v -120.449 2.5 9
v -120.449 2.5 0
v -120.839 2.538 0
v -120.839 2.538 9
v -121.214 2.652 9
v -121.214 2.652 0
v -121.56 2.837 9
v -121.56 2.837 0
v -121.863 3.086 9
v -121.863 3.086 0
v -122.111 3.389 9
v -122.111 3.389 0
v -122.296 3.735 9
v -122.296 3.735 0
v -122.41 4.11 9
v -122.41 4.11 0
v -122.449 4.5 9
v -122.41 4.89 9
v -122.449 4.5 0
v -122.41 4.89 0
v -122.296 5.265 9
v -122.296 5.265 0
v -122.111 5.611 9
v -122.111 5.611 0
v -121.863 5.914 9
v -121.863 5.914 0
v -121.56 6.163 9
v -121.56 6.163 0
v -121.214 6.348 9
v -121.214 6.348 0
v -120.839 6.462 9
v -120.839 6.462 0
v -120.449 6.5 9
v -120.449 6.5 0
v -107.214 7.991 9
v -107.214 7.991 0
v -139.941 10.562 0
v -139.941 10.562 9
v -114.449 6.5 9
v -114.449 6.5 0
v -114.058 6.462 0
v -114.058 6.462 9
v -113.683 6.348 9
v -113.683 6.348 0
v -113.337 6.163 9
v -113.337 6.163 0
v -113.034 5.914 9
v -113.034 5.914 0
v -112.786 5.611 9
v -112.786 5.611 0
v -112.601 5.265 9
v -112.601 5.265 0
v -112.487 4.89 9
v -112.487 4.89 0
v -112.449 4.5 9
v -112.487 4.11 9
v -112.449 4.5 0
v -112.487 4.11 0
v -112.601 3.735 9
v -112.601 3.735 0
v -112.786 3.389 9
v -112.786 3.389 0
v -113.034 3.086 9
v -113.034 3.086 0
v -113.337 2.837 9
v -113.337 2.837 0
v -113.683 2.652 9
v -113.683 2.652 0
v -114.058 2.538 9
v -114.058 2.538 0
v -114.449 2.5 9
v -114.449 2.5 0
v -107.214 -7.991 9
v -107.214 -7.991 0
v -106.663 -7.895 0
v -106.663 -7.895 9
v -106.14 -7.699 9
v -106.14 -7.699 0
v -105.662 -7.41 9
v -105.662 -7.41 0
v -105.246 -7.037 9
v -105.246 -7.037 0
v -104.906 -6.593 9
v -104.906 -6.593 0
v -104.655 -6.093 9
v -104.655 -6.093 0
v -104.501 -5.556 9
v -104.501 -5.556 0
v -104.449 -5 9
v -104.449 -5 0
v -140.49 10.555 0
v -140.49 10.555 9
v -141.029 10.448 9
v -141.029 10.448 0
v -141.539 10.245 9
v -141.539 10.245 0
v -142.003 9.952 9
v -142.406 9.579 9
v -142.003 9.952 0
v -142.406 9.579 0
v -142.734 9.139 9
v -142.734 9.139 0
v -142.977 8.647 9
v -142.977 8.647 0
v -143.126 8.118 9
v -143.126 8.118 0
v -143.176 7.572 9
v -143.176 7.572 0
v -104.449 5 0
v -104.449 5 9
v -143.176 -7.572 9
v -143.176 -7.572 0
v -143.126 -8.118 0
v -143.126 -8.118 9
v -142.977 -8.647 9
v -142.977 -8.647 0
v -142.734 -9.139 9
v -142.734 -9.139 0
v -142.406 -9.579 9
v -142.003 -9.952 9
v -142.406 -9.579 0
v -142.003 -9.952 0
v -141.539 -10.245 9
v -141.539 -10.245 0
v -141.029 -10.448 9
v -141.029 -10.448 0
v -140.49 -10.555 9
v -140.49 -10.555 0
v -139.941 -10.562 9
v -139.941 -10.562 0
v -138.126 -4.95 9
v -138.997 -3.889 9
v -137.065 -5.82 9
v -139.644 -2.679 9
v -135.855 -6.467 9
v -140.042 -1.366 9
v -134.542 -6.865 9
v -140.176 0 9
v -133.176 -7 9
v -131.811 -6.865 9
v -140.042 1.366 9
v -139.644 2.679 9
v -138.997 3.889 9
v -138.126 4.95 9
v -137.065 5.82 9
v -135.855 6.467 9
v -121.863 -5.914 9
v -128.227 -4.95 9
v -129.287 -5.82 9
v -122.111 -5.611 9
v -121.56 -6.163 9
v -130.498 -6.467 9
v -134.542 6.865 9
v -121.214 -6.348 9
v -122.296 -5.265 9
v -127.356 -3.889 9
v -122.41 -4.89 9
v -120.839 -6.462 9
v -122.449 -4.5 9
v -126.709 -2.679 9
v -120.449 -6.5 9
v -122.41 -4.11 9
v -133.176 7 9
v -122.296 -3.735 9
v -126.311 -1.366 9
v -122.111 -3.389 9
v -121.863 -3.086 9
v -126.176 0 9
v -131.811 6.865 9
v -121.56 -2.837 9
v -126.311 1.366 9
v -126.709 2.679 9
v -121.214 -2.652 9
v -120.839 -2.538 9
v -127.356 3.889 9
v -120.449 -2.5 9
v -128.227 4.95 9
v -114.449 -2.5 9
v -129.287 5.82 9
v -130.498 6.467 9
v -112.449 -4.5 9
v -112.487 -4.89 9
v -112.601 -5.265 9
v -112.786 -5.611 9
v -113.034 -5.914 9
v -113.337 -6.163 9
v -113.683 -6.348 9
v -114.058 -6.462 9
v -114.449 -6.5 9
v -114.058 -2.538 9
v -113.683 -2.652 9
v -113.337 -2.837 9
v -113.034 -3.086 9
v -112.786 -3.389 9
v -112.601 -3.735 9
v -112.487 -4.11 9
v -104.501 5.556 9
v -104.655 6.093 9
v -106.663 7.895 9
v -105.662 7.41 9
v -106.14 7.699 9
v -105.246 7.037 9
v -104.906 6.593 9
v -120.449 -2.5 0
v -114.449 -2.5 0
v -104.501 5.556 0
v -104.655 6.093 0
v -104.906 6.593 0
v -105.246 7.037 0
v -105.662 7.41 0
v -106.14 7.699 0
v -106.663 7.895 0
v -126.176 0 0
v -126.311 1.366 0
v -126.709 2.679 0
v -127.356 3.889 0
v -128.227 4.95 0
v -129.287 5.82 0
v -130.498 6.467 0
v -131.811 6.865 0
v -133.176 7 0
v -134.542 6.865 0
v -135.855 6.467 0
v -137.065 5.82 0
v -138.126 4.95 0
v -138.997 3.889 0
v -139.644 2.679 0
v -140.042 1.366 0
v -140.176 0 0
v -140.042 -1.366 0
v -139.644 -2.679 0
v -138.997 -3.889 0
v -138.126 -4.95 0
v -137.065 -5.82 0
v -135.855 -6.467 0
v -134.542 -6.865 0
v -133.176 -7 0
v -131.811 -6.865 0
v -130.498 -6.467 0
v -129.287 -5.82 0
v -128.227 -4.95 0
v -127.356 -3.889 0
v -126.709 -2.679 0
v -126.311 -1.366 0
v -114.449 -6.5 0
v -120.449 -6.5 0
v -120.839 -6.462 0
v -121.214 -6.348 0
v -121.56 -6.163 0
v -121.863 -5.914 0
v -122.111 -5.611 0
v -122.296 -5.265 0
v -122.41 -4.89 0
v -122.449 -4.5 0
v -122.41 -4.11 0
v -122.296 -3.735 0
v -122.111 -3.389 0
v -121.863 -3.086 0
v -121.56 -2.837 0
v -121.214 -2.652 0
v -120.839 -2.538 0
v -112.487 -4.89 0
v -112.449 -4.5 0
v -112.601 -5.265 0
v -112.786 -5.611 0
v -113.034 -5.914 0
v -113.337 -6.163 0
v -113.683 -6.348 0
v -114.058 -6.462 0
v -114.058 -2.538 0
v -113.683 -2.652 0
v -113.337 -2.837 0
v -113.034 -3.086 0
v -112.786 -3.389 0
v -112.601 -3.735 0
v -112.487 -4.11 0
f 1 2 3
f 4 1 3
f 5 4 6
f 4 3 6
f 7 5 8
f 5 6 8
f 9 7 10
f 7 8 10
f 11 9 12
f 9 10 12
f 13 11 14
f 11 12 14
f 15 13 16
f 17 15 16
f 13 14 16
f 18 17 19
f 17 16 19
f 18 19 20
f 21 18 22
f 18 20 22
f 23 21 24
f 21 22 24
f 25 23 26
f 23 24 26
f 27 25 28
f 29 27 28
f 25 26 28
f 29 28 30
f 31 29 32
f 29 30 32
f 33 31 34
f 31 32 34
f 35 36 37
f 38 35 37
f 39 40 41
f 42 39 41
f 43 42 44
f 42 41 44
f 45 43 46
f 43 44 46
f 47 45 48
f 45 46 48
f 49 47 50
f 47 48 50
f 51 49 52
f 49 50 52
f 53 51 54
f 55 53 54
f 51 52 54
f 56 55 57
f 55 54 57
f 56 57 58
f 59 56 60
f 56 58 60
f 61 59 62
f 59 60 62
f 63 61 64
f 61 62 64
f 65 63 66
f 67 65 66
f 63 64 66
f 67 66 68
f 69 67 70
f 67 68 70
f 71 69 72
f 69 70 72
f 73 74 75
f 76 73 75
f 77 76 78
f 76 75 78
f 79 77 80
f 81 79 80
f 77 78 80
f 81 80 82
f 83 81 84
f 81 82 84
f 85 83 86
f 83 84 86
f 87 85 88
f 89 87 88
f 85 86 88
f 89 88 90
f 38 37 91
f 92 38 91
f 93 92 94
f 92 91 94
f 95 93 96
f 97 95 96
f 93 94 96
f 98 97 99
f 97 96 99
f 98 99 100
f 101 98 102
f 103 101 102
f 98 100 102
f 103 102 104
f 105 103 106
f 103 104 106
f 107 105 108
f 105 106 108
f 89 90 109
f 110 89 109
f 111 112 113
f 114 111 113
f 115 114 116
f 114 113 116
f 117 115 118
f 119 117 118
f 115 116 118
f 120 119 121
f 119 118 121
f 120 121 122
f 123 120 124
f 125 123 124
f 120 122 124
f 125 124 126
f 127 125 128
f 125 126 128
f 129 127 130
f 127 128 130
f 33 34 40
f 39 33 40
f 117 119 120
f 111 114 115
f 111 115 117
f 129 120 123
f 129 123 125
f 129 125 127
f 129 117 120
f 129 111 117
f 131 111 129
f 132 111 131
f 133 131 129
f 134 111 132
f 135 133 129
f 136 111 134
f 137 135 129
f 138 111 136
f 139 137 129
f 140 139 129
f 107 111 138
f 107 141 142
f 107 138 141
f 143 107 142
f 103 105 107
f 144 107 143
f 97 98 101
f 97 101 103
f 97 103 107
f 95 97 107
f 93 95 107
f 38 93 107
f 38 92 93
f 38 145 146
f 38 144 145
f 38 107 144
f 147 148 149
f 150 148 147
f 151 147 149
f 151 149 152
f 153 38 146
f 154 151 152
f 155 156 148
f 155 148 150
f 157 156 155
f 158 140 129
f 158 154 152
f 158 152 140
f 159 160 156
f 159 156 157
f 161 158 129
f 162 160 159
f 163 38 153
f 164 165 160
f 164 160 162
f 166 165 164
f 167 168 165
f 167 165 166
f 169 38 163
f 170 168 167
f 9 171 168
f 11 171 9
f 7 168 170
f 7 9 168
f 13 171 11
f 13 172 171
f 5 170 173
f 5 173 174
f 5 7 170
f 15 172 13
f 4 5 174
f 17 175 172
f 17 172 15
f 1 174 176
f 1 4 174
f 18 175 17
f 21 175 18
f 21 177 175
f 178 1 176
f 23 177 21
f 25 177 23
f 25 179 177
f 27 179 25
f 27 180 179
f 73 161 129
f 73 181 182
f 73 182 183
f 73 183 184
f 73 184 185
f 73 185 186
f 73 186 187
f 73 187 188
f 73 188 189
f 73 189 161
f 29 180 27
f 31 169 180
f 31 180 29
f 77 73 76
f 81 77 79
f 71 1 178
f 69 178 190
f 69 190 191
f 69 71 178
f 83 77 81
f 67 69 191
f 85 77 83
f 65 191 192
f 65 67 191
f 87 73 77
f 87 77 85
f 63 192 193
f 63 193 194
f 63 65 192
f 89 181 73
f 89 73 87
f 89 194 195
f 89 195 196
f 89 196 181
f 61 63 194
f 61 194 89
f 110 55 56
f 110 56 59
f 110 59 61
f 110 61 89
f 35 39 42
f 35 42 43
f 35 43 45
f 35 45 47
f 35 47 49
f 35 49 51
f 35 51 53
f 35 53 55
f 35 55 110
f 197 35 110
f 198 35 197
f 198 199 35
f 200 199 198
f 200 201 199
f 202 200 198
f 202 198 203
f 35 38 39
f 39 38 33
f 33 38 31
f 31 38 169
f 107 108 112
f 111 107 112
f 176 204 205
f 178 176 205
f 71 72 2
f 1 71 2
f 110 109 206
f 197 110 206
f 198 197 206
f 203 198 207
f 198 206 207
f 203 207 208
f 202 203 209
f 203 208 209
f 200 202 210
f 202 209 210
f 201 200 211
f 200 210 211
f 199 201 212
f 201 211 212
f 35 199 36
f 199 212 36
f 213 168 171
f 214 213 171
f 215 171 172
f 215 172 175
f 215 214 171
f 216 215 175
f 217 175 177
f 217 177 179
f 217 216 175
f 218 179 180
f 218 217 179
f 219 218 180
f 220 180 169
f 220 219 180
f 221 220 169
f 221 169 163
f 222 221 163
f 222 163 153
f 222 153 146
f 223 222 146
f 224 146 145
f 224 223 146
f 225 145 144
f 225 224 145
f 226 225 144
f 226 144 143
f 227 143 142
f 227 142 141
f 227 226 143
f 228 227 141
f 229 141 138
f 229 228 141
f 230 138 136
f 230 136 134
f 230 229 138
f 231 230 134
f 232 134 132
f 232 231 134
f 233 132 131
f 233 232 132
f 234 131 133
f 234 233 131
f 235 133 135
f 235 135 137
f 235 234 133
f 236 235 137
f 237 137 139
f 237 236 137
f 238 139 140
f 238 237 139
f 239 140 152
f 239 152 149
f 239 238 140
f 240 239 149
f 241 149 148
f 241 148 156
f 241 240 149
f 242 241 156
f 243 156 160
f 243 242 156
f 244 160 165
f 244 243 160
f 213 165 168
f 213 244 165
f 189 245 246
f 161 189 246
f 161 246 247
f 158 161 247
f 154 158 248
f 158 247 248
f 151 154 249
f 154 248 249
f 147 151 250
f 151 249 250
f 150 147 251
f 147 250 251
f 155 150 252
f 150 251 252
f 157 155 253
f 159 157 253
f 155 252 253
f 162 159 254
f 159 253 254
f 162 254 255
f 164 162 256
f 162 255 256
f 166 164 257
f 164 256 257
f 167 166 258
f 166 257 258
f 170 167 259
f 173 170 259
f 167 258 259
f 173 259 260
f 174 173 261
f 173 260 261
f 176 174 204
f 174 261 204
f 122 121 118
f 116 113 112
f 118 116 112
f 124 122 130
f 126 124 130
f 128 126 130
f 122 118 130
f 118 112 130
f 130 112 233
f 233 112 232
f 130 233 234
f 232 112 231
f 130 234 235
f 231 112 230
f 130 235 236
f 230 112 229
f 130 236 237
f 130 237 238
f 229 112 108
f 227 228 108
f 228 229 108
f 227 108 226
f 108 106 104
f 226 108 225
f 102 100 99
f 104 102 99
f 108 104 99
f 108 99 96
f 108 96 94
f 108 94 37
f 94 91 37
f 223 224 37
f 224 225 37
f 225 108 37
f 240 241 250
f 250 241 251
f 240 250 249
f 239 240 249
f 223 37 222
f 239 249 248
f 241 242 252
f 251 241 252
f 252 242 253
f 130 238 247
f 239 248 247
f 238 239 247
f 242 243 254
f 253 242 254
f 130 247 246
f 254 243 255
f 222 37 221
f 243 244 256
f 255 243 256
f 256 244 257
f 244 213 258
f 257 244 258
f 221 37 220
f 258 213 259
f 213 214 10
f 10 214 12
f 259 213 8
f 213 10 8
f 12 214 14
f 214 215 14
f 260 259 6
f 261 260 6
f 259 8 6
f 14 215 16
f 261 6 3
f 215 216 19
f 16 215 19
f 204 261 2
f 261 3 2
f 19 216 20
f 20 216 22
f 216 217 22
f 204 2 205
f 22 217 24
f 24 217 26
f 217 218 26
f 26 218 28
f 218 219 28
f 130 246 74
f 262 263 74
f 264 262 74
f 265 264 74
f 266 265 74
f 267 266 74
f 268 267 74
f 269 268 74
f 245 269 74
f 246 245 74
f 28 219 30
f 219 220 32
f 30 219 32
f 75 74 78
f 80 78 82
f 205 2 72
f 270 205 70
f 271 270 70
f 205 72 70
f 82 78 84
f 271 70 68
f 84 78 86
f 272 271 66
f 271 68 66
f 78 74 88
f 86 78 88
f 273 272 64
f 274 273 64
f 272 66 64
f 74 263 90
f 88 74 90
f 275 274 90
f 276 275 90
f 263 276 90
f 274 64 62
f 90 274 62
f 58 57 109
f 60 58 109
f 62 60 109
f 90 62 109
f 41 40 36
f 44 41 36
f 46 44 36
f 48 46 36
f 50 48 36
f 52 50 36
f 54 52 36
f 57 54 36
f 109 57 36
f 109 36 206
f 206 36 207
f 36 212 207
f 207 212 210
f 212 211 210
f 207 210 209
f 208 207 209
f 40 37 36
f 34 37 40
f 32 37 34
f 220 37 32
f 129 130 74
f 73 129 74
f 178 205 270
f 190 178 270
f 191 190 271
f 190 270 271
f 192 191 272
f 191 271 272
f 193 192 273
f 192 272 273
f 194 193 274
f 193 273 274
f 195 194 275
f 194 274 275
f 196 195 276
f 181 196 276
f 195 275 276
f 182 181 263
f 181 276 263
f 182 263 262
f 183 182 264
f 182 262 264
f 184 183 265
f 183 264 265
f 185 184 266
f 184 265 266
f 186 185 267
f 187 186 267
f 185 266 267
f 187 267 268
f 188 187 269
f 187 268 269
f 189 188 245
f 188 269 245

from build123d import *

# Parameters (mm, degrees)
SKETCH1_R           = 7
BOSS_EXTRUDE1_DEPTH = 9


with BuildPart() as part:
    # Sketch1 → Boss-Extrude1 (new body)
    with BuildSketch(Plane.XY):
        with BuildLine():
            Line((-139.941431307, -10.562383746), (-107.213509245, -7.990781577))
            ThreePointArc((-107.213509245, -7.990781577), (-105.245670948, -7.03654075), (-104.448510428, -5))
            Line((-104.448510428, -5), (-104.448510428, 5))
            ThreePointArc((-104.448510428, 5), (-105.245670948, 7.03654075), (-107.213509245, 7.990781577))
            Line((-107.213509245, 7.990781577), (-139.941431307, 10.562383746))
            ThreePointArc((-139.941431307, 10.562383746), (-142.212973239, 9.774441649), (-143.176432489, 7.571602169))
            Line((-143.176432489, 7.571602169), (-143.176432489, -7.571602169))
            ThreePointArc((-143.176432489, -7.571602169), (-142.212973239, -9.774441649), (-139.941431307, -10.562383746))
        make_face()
        with Locations((-133.176432489, 0)):
            Circle(SKETCH1_R, mode=Mode.SUBTRACT)
        with BuildLine():
            Line((-114.448510428, -6.5), (-120.448510428, -6.5))
            ThreePointArc((-120.448510428, -6.5), (-122.448510428, -4.5), (-120.448510428, -2.5))
            Line((-120.448510428, -2.5), (-114.448510428, -2.5))
            ThreePointArc((-114.448510428, -2.5), (-112.448510428, -4.5), (-114.448510428, -6.5))
        make_face(mode=Mode.SUBTRACT)
        with BuildLine():
            Line((-114.448510428, 2.5), (-120.448510428, 2.5))
            ThreePointArc((-120.448510428, 2.5), (-122.448510428, 4.5), (-120.448510428, 6.5))
            Line((-120.448510428, 6.5), (-114.448510428, 6.5))
            ThreePointArc((-114.448510428, 6.5), (-112.448510428, 4.5), (-114.448510428, 2.5))
        make_face(mode=Mode.SUBTRACT)
    extrude(amount=BOSS_EXTRUDE1_DEPTH)


solid = part.part
